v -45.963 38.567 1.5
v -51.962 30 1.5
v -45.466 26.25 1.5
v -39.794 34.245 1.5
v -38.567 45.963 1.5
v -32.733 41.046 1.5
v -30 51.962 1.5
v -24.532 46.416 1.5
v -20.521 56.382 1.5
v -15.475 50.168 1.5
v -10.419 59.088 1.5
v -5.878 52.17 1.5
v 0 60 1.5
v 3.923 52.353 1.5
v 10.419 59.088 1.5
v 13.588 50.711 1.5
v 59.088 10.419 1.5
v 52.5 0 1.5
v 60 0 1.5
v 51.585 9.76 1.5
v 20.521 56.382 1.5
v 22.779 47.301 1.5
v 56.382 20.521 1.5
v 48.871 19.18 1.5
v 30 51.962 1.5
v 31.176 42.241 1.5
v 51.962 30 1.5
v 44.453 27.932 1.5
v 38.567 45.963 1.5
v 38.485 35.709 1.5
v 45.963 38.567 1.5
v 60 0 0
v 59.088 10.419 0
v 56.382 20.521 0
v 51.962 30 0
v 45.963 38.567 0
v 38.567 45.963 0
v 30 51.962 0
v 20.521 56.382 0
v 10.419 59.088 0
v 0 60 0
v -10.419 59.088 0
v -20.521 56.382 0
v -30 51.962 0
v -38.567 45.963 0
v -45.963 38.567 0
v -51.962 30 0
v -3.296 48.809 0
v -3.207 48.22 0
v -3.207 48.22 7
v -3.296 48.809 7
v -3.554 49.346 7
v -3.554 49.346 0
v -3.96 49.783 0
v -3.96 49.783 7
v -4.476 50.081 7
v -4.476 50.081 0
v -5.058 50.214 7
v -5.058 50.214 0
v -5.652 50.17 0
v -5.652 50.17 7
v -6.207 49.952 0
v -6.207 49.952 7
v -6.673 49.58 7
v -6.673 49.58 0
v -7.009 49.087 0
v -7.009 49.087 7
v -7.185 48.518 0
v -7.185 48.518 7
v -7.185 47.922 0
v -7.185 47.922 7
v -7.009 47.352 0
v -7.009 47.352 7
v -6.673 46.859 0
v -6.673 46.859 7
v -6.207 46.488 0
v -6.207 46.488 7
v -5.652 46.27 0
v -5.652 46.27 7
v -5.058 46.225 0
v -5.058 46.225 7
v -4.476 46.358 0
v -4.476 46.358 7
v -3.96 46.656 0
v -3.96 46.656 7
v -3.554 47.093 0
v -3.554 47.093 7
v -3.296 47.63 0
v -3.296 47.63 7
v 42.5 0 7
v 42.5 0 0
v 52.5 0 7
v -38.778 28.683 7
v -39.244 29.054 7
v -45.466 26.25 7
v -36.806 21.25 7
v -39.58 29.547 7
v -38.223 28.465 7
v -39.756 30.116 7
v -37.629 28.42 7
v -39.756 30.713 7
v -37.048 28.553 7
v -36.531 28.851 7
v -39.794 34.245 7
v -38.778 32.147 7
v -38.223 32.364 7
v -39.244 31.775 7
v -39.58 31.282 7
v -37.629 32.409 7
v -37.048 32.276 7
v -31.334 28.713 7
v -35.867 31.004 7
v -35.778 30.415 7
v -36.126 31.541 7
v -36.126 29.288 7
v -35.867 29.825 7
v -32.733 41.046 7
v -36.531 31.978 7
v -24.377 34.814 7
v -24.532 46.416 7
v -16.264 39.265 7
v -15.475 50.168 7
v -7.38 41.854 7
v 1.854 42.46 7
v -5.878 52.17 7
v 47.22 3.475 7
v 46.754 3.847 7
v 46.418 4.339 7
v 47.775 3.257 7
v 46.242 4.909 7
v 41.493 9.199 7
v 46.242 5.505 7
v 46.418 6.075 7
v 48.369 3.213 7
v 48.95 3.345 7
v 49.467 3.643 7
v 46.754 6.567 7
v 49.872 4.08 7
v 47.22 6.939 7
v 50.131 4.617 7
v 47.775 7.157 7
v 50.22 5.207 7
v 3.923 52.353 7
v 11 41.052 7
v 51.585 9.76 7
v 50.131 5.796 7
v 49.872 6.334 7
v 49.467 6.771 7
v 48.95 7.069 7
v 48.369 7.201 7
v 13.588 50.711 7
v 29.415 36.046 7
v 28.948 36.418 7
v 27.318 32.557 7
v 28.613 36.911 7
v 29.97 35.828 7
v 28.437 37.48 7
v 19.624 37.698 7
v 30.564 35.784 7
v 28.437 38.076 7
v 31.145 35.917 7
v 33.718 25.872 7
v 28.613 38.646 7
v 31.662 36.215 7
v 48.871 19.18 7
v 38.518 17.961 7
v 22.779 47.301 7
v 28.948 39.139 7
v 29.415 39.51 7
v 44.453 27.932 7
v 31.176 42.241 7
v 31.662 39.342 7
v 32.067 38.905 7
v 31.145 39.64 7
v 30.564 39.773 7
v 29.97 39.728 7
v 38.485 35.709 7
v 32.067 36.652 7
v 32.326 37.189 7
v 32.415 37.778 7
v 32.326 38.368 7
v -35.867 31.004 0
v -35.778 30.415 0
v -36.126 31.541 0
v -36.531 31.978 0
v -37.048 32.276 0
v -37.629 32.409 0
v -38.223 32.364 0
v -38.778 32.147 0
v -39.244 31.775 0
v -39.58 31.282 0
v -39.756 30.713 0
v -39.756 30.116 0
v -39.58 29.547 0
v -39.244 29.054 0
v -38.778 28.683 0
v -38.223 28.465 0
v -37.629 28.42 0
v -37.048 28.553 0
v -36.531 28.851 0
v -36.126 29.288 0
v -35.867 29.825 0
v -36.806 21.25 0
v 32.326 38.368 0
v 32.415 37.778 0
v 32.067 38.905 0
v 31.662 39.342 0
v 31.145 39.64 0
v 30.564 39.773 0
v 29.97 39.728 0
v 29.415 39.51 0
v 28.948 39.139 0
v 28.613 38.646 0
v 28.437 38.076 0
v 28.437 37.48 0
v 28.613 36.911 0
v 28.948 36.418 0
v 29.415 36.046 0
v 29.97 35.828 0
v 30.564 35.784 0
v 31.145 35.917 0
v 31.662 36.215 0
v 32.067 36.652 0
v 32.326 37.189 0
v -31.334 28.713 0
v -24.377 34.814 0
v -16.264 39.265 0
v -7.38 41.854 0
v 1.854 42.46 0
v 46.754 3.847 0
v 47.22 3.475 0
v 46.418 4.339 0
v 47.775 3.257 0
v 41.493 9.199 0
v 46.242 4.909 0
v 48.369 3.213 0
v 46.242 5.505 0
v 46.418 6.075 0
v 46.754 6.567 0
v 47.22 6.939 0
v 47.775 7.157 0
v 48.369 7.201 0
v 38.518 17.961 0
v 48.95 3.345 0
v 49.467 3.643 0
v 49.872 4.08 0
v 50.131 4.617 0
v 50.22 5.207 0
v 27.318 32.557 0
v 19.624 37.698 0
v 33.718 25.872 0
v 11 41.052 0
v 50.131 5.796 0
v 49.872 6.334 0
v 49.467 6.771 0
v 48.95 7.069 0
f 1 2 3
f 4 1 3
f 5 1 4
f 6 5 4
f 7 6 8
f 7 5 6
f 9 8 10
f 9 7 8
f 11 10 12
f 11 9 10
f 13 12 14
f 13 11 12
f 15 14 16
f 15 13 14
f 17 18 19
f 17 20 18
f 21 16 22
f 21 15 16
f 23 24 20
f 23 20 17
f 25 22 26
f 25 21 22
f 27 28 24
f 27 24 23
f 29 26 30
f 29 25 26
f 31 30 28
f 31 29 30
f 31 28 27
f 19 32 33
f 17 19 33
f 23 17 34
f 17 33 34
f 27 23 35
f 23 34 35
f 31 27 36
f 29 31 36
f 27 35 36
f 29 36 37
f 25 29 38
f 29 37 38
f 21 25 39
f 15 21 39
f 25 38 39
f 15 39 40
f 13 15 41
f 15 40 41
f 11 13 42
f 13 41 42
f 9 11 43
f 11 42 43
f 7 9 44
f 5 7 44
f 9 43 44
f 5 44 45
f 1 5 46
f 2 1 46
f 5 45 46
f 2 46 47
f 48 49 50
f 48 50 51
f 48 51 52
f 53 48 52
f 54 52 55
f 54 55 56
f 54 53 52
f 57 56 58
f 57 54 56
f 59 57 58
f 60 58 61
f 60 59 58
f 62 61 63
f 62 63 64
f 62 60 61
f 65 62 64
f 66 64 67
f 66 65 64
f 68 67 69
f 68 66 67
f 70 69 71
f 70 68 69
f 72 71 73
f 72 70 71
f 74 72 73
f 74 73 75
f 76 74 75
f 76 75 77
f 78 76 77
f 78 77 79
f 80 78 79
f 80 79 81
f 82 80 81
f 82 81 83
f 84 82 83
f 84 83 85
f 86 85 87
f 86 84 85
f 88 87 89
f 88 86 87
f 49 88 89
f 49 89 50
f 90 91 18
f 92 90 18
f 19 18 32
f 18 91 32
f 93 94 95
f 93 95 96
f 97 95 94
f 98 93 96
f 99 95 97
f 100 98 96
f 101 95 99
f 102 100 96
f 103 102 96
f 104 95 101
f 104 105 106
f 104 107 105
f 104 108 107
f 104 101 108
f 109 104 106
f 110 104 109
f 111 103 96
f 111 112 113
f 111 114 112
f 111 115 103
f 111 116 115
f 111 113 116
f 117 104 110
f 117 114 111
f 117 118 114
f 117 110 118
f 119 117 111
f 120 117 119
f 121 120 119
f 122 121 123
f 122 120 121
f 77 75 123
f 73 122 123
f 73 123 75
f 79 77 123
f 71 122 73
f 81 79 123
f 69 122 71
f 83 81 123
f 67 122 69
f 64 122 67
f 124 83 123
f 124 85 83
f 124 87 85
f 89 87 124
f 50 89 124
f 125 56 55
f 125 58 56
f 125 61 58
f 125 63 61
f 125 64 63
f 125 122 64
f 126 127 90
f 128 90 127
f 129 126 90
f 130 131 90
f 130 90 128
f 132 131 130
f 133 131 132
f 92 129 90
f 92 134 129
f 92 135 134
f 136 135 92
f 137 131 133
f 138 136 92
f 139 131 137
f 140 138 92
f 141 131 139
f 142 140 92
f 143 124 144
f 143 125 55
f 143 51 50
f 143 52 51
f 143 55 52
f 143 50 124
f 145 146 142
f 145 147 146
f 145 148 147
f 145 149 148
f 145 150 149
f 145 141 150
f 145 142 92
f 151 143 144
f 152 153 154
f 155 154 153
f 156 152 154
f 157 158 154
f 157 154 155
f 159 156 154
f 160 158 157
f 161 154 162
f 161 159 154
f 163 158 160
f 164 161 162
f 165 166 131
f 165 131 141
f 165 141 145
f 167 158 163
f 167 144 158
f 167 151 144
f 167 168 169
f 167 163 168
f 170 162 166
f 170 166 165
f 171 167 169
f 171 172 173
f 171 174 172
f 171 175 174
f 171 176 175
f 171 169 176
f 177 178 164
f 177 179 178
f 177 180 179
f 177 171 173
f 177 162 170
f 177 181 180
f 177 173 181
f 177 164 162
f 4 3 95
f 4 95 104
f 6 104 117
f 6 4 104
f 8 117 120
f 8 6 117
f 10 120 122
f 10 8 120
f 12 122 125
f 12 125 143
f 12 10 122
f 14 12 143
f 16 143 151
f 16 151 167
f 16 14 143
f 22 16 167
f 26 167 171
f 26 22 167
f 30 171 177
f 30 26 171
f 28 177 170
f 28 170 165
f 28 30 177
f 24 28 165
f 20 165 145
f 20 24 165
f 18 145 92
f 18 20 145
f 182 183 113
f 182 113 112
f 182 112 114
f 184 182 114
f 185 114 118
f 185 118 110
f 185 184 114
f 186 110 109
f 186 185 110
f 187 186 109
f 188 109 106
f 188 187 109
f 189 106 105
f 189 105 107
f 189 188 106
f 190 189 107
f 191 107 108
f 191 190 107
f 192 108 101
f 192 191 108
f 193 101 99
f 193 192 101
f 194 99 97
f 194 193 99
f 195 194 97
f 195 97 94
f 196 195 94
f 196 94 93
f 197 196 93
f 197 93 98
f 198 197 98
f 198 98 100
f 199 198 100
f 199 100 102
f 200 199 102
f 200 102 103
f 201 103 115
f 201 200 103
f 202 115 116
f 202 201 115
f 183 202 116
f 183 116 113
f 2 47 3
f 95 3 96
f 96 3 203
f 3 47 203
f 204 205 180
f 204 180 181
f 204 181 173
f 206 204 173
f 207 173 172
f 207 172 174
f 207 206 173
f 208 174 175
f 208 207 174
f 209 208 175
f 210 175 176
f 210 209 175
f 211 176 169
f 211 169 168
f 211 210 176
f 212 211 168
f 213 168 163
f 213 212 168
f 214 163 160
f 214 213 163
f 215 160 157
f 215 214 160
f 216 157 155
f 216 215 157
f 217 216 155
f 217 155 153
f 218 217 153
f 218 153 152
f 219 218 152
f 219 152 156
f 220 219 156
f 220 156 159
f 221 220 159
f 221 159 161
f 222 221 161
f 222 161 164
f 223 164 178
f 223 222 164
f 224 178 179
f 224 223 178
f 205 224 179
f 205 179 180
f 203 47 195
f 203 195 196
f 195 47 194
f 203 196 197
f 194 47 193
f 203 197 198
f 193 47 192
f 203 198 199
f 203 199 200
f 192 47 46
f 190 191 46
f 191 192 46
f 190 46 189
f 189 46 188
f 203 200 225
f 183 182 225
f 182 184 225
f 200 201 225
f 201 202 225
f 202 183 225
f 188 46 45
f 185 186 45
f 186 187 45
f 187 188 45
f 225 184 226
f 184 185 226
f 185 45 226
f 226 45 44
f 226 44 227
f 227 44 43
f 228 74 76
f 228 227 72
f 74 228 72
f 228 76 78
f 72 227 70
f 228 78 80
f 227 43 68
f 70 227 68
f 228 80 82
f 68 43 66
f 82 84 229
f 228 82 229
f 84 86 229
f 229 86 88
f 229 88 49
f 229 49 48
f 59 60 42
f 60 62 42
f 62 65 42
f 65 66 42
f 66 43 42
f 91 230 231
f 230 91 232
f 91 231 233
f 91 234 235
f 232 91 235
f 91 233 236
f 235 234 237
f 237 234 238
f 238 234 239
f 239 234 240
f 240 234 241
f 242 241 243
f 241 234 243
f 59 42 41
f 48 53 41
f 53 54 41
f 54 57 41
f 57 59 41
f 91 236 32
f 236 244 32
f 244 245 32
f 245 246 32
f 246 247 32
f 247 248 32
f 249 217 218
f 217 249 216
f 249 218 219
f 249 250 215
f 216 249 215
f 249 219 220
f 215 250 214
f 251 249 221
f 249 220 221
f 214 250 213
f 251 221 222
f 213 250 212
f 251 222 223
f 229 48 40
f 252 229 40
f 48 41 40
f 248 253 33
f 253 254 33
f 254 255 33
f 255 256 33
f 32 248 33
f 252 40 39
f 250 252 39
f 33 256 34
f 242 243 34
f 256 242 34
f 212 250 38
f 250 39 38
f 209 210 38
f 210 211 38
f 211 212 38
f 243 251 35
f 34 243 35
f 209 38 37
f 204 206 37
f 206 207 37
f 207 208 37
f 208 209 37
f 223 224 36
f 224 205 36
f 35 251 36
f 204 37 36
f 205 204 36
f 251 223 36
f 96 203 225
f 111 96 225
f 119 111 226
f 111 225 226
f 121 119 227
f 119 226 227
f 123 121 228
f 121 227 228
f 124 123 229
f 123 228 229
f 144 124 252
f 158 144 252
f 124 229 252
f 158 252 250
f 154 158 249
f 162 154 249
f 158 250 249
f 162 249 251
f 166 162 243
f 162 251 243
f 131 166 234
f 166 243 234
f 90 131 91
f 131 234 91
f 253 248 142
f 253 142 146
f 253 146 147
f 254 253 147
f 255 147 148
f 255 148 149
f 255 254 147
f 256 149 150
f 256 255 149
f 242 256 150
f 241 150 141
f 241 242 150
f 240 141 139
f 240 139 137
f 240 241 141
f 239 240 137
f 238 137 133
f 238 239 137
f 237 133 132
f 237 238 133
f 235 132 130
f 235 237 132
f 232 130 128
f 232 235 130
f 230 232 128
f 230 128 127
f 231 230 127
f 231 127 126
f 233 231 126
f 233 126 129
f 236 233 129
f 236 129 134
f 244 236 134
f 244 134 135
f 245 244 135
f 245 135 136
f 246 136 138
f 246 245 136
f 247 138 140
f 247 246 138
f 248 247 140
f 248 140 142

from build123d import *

# Parameters (mm, degrees)
SKETCH_1_R          = 2
EXTRUDE_1_DEPTH     = 7
CUT_EXTRUDE_START   = -5.5
CUT_EXTRUDE_1_DEPTH = 5.5


with BuildPart() as part:
    # 草图1 → 凸台-拉伸1 (new body)
    with BuildSketch(Plane.XY):
        with BuildLine():
            Line((42.5, 0), (60, 0))
            ThreePointArc((60, 0), (15.529142706, 57.955549577), (-51.961524227, 30))
            Line((-51.961524227, 30), (-36.806079661, 21.25))
            ThreePointArc((-36.806079661, 21.25), (10.999809417, 41.051847617), (42.5, 0))
        make_face()
        with Locations((48.219679614, 5.206966288)):
            Circle(SKETCH_1_R, mode=Mode.SUBTRACT)
        with Locations((-37.778343613, 30.41458127)):
            Circle(SKETCH_1_R, mode=Mode.SUBTRACT)
        with Locations((-5.206966288, 48.219679614)):
            Circle(SKETCH_1_R, mode=Mode.SUBTRACT)
        with Locations((30.41458127, 37.778343613)):
            Circle(SKETCH_1_R, mode=Mode.SUBTRACT)
    extrude(amount=EXTRUDE_1_DEPTH)

    # 草图2 → 切除-拉伸1 (cut)
    with BuildSketch(Plane.XY.offset(7).offset(CUT_EXTRUDE_START)):
        with BuildLine():
            Line((52.5, 0), (60, 0))
            ThreePointArc((60, 0), (15.529142706, 57.955549577), (-51.961524227, 30))
            Line((-51.961524227, 30), (-45.466333699, 26.25))
            ThreePointArc((-45.466333699, 26.25), (13.587999868, 50.71110588), (52.5, 0))
        make_face()
    extrude(amount=CUT_EXTRUDE_1_DEPTH, mode=Mode.SUBTRACT)


solid = part.part
